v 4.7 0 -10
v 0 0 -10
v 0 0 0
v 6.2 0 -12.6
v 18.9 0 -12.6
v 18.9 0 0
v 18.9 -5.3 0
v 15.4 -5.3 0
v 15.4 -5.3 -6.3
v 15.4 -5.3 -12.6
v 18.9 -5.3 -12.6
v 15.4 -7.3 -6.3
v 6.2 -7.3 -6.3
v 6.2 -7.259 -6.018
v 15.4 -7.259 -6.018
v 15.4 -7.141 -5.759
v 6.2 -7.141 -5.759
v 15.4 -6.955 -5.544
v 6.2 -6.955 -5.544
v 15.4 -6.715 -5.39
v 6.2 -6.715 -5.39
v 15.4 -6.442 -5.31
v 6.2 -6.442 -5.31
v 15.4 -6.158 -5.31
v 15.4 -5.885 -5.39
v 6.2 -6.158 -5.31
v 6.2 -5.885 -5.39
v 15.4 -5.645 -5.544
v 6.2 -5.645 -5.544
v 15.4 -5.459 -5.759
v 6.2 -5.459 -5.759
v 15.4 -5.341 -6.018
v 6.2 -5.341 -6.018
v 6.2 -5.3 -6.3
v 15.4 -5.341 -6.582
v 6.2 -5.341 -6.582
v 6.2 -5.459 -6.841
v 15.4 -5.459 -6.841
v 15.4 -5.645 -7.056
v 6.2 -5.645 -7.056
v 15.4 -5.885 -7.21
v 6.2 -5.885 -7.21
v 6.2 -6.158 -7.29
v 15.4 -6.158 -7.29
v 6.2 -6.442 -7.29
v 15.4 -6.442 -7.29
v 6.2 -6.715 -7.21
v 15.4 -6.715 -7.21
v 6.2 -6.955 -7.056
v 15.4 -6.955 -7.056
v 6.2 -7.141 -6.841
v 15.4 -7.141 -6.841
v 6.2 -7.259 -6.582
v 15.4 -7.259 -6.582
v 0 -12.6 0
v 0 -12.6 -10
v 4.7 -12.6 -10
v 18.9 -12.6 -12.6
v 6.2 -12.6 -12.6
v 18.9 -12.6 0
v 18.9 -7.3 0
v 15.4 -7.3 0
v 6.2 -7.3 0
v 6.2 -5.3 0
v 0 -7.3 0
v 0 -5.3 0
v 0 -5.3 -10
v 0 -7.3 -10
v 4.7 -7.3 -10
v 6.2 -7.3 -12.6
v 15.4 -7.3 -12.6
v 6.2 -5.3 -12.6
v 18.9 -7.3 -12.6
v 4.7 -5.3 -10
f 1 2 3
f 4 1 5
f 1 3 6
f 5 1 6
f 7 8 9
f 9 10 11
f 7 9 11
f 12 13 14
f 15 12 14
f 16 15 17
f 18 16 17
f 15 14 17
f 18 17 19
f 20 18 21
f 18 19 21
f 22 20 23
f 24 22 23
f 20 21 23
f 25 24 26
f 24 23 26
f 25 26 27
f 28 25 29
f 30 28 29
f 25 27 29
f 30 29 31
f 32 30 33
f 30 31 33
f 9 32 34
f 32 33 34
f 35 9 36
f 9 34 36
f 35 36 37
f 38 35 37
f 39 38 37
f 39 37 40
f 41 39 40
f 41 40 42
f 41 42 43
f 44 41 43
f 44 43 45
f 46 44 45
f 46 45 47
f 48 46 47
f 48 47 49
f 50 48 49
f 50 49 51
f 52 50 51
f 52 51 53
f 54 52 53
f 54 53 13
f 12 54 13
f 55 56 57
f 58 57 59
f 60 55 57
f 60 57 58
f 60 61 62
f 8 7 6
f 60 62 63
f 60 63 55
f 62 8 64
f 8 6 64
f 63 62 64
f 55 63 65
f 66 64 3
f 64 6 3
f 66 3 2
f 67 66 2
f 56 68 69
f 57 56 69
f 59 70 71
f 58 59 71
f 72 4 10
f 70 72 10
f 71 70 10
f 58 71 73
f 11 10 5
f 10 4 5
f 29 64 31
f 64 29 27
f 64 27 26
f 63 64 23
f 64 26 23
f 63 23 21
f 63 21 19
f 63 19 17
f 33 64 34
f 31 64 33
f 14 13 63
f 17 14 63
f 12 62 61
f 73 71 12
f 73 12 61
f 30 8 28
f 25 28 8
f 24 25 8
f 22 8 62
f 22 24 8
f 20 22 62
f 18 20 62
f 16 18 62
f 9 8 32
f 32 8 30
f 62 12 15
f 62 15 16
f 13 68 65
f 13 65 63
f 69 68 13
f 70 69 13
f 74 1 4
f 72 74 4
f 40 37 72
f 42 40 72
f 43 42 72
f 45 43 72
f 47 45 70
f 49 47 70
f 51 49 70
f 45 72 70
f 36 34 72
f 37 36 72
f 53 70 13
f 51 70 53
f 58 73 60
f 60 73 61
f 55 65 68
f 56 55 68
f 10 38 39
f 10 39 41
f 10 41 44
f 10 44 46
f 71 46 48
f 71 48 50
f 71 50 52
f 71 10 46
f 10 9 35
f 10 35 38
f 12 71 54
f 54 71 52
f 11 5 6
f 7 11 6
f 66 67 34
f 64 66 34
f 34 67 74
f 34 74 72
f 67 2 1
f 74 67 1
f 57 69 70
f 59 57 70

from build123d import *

# Parameters (mm, degrees)
F1_DEPTH = 12.6
F2_W     = 6.2
F2_H     = 2
F3_DEPTH = 12.601
F2_W_2   = 3.5
F4_DEPTH = 12.601
F6_DEPTH = 12.701


with BuildPart() as f1:
    # F0 (on Front) → F1 (new body)
    with BuildSketch(Plane.XZ):
        Polygon((18.9, 0), (0, 0), (0, -10), (4.7, -10), (6.2, -12.6), (18.9, -12.6), align=None)
    extrude(amount=F1_DEPTH)

    # F2 (on face) → F3 (cut, through all)
    with BuildSketch(Plane(origin=(0, 0, -12.6), x_dir=(1, 0, 0), z_dir=(0, 0, -1))):
        with Locations((3.1, 6.3)):
            Rectangle(F2_W, F2_H)
    extrude(amount=-F3_DEPTH, mode=Mode.SUBTRACT)

    # F2 (on face) → F4 (cut, through all)
    with BuildSketch(Plane(origin=(0, 0, -12.6), x_dir=(1, 0, 0), z_dir=(0, 0, -1))):
        with Locations((17.15, 6.3)):
            Rectangle(F2_W_2, F2_H)
    extrude(amount=-F4_DEPTH, mode=Mode.SUBTRACT)

    # F5 (on face) → F6 (cut, through all)
    with BuildSketch(Plane(origin=(6.2, 0, 0), x_dir=(0, -1, 0), z_dir=(-1, 0, 0))):
        with BuildLine():
            ThreePointArc((5.3, -6.3), (6.3, -7.3), (7.3, -6.3))
            ThreePointArc((7.3, -6.3), (6.3, -5.3), (5.3, -6.3))
        make_face()
    extrude(amount=-F6_DEPTH, mode=Mode.SUBTRACT)


solid = f1.part
